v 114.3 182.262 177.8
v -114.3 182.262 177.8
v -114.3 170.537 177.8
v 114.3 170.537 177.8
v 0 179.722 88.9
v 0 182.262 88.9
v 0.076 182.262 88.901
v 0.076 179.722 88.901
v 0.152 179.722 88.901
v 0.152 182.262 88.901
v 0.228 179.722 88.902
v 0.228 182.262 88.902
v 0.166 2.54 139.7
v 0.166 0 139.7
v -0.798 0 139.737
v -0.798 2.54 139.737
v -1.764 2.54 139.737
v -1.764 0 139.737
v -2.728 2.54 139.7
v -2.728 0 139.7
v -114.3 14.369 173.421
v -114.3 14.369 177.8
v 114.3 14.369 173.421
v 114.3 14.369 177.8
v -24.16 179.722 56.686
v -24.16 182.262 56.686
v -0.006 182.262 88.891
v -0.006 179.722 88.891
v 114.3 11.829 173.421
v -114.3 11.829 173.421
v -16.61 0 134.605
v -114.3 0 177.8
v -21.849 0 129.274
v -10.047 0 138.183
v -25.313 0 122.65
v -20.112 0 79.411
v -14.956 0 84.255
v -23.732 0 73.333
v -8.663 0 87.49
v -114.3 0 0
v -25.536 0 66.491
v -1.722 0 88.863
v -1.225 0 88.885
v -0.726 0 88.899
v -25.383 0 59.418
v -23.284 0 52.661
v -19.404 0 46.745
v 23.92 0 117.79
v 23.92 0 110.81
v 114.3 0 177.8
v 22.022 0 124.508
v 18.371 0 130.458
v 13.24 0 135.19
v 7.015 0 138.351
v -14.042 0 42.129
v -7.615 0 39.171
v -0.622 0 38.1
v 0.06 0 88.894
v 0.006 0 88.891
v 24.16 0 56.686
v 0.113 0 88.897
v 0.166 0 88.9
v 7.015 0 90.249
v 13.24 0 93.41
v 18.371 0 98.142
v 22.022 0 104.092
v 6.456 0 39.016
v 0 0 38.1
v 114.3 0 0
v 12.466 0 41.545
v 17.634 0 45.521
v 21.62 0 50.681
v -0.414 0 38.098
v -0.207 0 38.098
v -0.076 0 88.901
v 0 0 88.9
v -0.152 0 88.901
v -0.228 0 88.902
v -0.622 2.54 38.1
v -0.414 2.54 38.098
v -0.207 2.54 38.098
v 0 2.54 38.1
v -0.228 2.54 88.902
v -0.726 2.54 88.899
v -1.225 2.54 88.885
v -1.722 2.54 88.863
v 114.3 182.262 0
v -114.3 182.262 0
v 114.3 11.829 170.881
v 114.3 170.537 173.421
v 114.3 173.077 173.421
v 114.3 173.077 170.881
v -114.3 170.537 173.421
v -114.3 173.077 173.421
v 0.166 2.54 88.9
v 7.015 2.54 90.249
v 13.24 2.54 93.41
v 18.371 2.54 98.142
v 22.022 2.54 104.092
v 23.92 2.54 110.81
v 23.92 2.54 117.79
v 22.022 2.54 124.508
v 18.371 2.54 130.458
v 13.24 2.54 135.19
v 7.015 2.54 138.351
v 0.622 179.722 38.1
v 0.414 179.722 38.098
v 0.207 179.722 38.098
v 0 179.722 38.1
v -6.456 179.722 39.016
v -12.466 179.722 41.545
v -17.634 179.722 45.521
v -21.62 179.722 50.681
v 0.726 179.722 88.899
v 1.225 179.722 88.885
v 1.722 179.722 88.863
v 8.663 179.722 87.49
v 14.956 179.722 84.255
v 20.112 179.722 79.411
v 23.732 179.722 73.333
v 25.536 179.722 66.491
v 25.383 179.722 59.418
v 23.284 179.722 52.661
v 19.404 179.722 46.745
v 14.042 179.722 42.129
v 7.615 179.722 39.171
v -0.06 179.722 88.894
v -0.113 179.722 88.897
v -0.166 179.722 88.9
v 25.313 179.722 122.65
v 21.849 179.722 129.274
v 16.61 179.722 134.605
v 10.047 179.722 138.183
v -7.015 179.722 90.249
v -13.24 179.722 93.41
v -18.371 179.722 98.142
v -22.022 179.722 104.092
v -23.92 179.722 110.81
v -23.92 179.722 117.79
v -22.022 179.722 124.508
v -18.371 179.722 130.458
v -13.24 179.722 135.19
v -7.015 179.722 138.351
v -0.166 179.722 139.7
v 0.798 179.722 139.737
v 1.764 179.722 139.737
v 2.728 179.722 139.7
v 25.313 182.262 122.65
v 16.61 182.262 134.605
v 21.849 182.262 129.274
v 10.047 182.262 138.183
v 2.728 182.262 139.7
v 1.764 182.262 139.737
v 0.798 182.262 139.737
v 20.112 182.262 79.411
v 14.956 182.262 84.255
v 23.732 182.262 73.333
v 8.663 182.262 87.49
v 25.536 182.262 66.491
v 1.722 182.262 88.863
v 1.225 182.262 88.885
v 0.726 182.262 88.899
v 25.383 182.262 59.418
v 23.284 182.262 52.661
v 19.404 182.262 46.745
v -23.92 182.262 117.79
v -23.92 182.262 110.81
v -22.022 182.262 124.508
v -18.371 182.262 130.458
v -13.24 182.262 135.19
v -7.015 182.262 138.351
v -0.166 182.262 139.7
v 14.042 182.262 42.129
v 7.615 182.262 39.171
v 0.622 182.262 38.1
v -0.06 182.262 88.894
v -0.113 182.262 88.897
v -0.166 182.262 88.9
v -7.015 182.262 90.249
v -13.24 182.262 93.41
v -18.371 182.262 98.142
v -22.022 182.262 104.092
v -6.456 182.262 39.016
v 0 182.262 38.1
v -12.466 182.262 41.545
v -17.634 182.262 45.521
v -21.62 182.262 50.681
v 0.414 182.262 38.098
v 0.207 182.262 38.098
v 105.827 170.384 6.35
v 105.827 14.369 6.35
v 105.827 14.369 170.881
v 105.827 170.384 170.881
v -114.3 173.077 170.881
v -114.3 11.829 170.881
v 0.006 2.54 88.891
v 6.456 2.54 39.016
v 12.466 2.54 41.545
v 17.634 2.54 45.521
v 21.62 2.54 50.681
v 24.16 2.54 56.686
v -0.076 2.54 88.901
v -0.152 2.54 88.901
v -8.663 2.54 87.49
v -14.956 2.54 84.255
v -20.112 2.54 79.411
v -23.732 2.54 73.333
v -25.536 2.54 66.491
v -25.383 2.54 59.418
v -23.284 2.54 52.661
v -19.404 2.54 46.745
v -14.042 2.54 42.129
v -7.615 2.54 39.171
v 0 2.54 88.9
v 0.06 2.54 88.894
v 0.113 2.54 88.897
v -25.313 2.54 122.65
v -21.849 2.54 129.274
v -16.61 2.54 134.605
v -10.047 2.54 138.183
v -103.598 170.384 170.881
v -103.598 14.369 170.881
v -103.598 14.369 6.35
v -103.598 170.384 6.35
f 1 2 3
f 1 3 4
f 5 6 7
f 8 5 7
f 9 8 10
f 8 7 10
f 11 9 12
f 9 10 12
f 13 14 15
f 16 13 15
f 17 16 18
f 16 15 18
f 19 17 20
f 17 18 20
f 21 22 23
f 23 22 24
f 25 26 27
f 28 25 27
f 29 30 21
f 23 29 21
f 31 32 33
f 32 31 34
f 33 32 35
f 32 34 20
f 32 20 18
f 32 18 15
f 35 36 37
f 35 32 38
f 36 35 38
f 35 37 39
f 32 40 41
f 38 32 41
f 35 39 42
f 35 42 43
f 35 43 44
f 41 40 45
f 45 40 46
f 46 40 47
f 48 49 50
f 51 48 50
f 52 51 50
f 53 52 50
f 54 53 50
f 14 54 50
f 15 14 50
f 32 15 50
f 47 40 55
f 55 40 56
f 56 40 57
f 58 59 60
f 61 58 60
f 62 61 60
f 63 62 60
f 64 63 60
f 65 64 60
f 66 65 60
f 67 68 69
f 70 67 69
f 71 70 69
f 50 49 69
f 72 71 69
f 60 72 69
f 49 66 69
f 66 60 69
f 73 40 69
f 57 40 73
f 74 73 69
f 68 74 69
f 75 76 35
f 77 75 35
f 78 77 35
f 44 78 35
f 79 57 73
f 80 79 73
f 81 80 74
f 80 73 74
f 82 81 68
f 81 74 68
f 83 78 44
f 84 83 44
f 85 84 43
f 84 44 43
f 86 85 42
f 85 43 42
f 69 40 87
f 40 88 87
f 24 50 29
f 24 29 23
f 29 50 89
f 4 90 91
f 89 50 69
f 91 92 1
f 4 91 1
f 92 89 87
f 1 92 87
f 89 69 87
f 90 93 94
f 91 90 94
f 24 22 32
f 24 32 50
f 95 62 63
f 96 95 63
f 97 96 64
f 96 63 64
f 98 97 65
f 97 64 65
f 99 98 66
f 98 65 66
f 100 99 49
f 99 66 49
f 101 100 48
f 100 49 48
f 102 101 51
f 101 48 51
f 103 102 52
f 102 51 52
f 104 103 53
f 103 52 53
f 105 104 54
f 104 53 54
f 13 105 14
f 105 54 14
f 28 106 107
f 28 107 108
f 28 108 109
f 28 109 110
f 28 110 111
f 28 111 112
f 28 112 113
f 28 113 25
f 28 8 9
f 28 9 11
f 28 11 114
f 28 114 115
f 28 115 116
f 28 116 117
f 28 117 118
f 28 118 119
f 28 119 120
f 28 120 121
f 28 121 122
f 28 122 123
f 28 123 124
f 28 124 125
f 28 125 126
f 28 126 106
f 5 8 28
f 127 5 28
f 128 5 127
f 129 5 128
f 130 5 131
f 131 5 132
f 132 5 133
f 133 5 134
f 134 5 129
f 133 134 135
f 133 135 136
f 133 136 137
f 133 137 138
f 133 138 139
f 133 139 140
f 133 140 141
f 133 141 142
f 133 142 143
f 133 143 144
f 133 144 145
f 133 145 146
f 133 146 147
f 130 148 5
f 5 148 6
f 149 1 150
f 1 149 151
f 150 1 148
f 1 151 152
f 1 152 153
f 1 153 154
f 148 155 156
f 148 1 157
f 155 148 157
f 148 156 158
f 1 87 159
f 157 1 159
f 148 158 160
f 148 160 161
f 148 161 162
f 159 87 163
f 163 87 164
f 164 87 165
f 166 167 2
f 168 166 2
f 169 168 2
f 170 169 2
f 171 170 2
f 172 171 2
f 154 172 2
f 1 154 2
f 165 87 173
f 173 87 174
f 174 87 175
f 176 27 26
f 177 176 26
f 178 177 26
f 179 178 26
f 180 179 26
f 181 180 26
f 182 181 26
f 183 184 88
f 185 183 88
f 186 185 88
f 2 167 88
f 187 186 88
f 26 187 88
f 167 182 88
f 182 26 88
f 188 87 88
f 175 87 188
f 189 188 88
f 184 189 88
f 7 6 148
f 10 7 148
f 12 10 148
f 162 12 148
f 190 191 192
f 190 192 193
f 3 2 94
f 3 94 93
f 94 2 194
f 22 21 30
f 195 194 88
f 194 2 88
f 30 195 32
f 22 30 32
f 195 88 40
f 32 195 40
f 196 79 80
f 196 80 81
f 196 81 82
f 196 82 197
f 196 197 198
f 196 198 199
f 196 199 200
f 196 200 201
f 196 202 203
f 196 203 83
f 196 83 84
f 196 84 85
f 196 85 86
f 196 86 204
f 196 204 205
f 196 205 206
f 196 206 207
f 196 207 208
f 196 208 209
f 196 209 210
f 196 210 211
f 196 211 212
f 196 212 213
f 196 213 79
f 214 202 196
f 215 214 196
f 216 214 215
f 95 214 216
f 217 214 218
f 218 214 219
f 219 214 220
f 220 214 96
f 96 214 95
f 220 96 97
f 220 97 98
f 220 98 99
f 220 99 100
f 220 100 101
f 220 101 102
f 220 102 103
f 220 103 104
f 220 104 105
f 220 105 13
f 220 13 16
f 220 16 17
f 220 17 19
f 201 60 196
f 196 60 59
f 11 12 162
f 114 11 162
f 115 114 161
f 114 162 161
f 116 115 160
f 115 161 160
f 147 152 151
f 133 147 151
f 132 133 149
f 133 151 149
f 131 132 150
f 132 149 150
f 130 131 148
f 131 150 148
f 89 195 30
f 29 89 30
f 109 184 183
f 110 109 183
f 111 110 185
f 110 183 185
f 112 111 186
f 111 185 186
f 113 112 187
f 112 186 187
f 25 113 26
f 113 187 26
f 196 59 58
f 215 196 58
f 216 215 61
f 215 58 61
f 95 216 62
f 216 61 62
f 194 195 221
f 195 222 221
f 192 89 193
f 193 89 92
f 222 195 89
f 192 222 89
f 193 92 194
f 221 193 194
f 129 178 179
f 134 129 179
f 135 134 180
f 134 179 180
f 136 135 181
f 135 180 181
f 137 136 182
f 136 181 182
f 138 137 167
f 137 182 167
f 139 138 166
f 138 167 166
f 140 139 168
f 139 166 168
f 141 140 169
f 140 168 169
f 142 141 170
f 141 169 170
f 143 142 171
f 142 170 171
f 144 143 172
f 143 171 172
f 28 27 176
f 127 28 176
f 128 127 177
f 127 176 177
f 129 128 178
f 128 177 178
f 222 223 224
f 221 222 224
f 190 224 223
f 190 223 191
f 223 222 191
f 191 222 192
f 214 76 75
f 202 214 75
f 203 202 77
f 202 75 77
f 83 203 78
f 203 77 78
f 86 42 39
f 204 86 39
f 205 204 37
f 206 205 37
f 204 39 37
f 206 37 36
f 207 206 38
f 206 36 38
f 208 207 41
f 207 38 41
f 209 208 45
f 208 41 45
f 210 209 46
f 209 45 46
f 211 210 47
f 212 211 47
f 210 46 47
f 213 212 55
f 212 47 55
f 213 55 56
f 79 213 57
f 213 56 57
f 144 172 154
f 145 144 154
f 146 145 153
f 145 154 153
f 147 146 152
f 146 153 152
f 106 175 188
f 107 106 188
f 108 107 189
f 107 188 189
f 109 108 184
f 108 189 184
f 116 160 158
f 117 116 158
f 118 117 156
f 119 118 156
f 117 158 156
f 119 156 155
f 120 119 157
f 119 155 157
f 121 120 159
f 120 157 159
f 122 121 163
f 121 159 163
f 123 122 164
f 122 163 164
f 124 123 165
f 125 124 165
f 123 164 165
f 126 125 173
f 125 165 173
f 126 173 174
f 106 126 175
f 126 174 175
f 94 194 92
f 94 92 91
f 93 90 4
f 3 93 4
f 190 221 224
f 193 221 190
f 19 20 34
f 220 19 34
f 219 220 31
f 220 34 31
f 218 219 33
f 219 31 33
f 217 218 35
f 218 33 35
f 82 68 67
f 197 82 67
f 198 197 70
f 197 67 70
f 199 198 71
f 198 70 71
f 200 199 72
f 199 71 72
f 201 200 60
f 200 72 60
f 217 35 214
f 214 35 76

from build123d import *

# Parameters (mm, degrees)
F1_DEPTH  = 177.8
F2_W      = 209.4248831272
F2_H      = 156.0155125335
F3_DEPTH  = 171.45
F4_W      = 155.5528063327
F4_H      = 6.91875844
F5_DEPTH  = 228.601
F6_W      = 2.54
F6_H      = 2.54
F7_DEPTH  = 228.601
F8_W      = 2.54
F8_H      = 2.54
F9_DEPTH  = 228.601
F10_W     = 8.4731229424
F10_H     = 0.6152642891
F11_DEPTH = 5.08
F12_W     = 10.7019939303
F12_H     = 0.6152642891
F13_DEPTH = 5.08
F14_W     = 0.6152642891
F14_H     = 2.54
F15_DEPTH = 228.601
F18_DEPTH = 2.54
F20_DEPTH = 2.54


with BuildPart() as f1:
    # F0 (on Top) → F1 (new body)
    with BuildSketch(Plane.XY):
        Polygon((-114.3, 0), (0, 0), (114.3, 0), (114.3, 182.2615116835), (-114.3, 182.2615116835), align=None)
    extrude(amount=F1_DEPTH)

    # F2 (on face) → F3 (cut)
    with BuildSketch(Plane.XY.offset(177.8)):
        with Locations((1.1144354939, 92.3765613697)):
            Rectangle(F2_W, F2_H)
    extrude(amount=-F3_DEPTH, mode=Mode.SUBTRACT)

    # F4 (on face) → F5 (cut, through all)
    with BuildSketch(Plane.YZ.offset(114.3)):
        with Locations((92.7604725584, 174.34062078)):
            Rectangle(F4_W, F4_H)
    extrude(amount=-F5_DEPTH, mode=Mode.SUBTRACT)

    # F6 (on face) → F7 (cut, through all)
    with BuildSketch(Plane.YZ.offset(114.3)):
        with Locations((171.8068757248, 172.15124156)):
            Rectangle(F6_W, F6_H)
    extrude(amount=-F7_DEPTH, mode=Mode.SUBTRACT)

    # F8 (on face) → F9 (cut, through all)
    with BuildSketch(Plane.YZ.offset(114.3)):
        with Locations((13.7140693921, 172.15124156)):
            Rectangle(F8_W, F8_H)
    extrude(amount=-F9_DEPTH, mode=Mode.SUBTRACT)

    # F10 (on face) → F11 (cut)
    with BuildSketch(Plane.XY.offset(177.8)):
        with Locations((110.0634385288, 14.6764372475)):
            Rectangle(F10_W, F10_H)
    extrude(amount=-F11_DEPTH, mode=Mode.SUBTRACT)

    # F12 (on face) → F13 (cut)
    with BuildSketch(Plane.XY.offset(177.8)):
        with Locations((-108.9490030348, 14.6764372475)):
            Rectangle(F12_W, F12_H)
    extrude(amount=-F13_DEPTH, mode=Mode.SUBTRACT)

    # F14 (on face) → F15 (cut, through all)
    with BuildSketch(Plane.YZ.offset(114.3)):
        with Locations((12.1364372475, 172.15124156)):
            Rectangle(F14_W, F14_H)
    extrude(amount=-F15_DEPTH, mode=Mode.SUBTRACT)

    # F17 (on face) → F18 (cut)
    with BuildSketch(Plane.XZ):
        with BuildLine():
            ThreePointArc((-0.6215579752, 38.1), (-0.3107789876, 38.0980988196), (0, 38.1))
            Line((0, 38.1), (-0.6215579752, 38.1))
        make_face()
        with BuildLine():
            Line((-0.6215579752, 38.1), (0, 38.1))
            ThreePointArc((0, 38.1), (15.1778442025, 43.3664673926), (24.1602391289, 56.6863478281))
            Line((24.1602391289, 56.6863478281), (0.0064452881, 88.8914062825))
            ThreePointArc((0.0064452881, 88.8914062825), (-0.8577674698, 88.8623323611), (-1.722469087, 88.8626440783))
            ThreePointArc((-1.722469087, 88.8626440783), (-25.7067084526, 62.9492276466), (-0.6215579752, 38.1))
        make_face()
        with BuildLine():
            ThreePointArc((-0.227703523, 88.9017653333), (-0.9753742254, 88.8932057202), (-1.722469087, 88.8626440783))
            ThreePointArc((-1.722469087, 88.8626440783), (-0.8577674698, 88.8623323611), (0.0064452881, 88.8914062825))
            Line((0.0064452881, 88.8914062825), (0, 88.9))
            ThreePointArc((0, 88.9), (-0.1138537398, 88.9006274972), (-0.227703523, 88.9017653333))
        make_face()
        with BuildLine():
            Line((0, 88.9), (0.0064452881, 88.8914062825))
            ThreePointArc((0.0064452881, 88.8914062825), (0.0862911744, 88.8955776847), (0.1661235568, 88.9))
            ThreePointArc((0.1661235568, 88.9), (0.0830617784, 88.8998641882), (0, 88.9))
        make_face()
        with BuildLine():
            ThreePointArc((0, 88.9), (-0.1138497834, 88.9011378184), (-0.227703523, 88.9017653333))
            ThreePointArc((-0.227703523, 88.9017653333), (-0.1138537398, 88.9006274972), (0, 88.9))
        make_face()
        with BuildLine():
            Line((-25.3127280516, 122.6503040688), (0, 88.9))
            ThreePointArc((0, 88.9), (0.0830617784, 88.8998641882), (0.1661235568, 88.9))
            ThreePointArc((0.1661235568, 88.9), (24.1602391289, 114.3), (0.1661235568, 139.7))
            Line((0.1661235568, 139.7), (0, 139.7))
            Line((0, 139.7), (-2.7280201219, 139.7))
            ThreePointArc((-2.7280201219, 139.7), (-16.6095490882, 134.6048766126), (-25.3127280516, 122.6503040688))
        make_face()
        with BuildLine():
            Line((0, 139.7), (0.1661235568, 139.7))
            ThreePointArc((0.1661235568, 139.7), (0.0830617784, 139.7001358118), (0, 139.7))
        make_face()
        with BuildLine():
            ThreePointArc((0, 139.7), (0.0830617784, 139.7001358118), (0.1661235568, 139.7))
            ThreePointArc((0.1661235568, 139.7), (-1.2809482826, 139.7411874115), (-2.7280201219, 139.7))
            Line((-2.7280201219, 139.7), (0, 139.7))
        make_face()
    extrude(amount=-F18_DEPTH, mode=Mode.SUBTRACT)

    # F19 (on face) → F20 (cut)
    with BuildSketch(Plane(origin=(0, 182.2615116835, 0), x_dir=(-1, 0, 0), z_dir=(0, 1, 0))):
        with BuildLine():
            ThreePointArc((-0.6215579752, 38.1), (-0.3107789876, 38.0980988196), (0, 38.1))
            Line((0, 38.1), (-0.6215579752, 38.1))
        make_face()
        with BuildLine():
            Line((-0.6215579752, 38.1), (0, 38.1))
            ThreePointArc((0, 38.1), (15.1778442025, 43.3664673926), (24.1602391289, 56.6863478281))
            Line((24.1602391289, 56.6863478281), (0.0064452881, 88.8914062825))
            ThreePointArc((0.0064452881, 88.8914062825), (-0.8577674698, 88.8623323611), (-1.722469087, 88.8626440783))
            ThreePointArc((-1.722469087, 88.8626440783), (-25.7067084526, 62.9492276466), (-0.6215579752, 38.1))
        make_face()
        with BuildLine():
            ThreePointArc((-0.227703523, 88.9017653333), (-0.9753742254, 88.8932057202), (-1.722469087, 88.8626440783))
            ThreePointArc((-1.722469087, 88.8626440783), (-0.8577674698, 88.8623323611), (0.0064452881, 88.8914062825))
            Line((0.0064452881, 88.8914062825), (0, 88.9))
            ThreePointArc((0, 88.9), (-0.1138537398, 88.9006274972), (-0.227703523, 88.9017653333))
        make_face()
        with BuildLine():
            Line((0, 88.9), (0.0064452881, 88.8914062825))
            ThreePointArc((0.0064452881, 88.8914062825), (0.0862911744, 88.8955776847), (0.1661235568, 88.9))
            ThreePointArc((0.1661235568, 88.9), (0.0830617784, 88.8998641882), (0, 88.9))
        make_face()
        with BuildLine():
            ThreePointArc((0, 88.9), (-0.1138497834, 88.9011378184), (-0.227703523, 88.9017653333))
            ThreePointArc((-0.227703523, 88.9017653333), (-0.1138537398, 88.9006274972), (0, 88.9))
        make_face()
        with BuildLine():
            Line((-25.3127280516, 122.6503040688), (0, 88.9))
            ThreePointArc((0, 88.9), (0.0830617784, 88.8998641882), (0.1661235568, 88.9))
            ThreePointArc((0.1661235568, 88.9), (24.1602391289, 114.3), (0.1661235568, 139.7))
            Line((0.1661235568, 139.7), (0, 139.7))
            Line((0, 139.7), (-2.7280201219, 139.7))
            ThreePointArc((-2.7280201219, 139.7), (-16.6095490882, 134.6048766126), (-25.3127280516, 122.6503040688))
        make_face()
        with BuildLine():
            Line((0, 139.7), (0.1661235568, 139.7))
            ThreePointArc((0.1661235568, 139.7), (0.0830617784, 139.7001358118), (0, 139.7))
        make_face()
        with BuildLine():
            ThreePointArc((0, 139.7), (0.0830617784, 139.7001358118), (0.1661235568, 139.7))
            ThreePointArc((0.1661235568, 139.7), (-1.2809482826, 139.7411874115), (-2.7280201219, 139.7))
            Line((-2.7280201219, 139.7), (0, 139.7))
        make_face()
    extrude(amount=-F20_DEPTH, mode=Mode.SUBTRACT)


solid = f1.part
